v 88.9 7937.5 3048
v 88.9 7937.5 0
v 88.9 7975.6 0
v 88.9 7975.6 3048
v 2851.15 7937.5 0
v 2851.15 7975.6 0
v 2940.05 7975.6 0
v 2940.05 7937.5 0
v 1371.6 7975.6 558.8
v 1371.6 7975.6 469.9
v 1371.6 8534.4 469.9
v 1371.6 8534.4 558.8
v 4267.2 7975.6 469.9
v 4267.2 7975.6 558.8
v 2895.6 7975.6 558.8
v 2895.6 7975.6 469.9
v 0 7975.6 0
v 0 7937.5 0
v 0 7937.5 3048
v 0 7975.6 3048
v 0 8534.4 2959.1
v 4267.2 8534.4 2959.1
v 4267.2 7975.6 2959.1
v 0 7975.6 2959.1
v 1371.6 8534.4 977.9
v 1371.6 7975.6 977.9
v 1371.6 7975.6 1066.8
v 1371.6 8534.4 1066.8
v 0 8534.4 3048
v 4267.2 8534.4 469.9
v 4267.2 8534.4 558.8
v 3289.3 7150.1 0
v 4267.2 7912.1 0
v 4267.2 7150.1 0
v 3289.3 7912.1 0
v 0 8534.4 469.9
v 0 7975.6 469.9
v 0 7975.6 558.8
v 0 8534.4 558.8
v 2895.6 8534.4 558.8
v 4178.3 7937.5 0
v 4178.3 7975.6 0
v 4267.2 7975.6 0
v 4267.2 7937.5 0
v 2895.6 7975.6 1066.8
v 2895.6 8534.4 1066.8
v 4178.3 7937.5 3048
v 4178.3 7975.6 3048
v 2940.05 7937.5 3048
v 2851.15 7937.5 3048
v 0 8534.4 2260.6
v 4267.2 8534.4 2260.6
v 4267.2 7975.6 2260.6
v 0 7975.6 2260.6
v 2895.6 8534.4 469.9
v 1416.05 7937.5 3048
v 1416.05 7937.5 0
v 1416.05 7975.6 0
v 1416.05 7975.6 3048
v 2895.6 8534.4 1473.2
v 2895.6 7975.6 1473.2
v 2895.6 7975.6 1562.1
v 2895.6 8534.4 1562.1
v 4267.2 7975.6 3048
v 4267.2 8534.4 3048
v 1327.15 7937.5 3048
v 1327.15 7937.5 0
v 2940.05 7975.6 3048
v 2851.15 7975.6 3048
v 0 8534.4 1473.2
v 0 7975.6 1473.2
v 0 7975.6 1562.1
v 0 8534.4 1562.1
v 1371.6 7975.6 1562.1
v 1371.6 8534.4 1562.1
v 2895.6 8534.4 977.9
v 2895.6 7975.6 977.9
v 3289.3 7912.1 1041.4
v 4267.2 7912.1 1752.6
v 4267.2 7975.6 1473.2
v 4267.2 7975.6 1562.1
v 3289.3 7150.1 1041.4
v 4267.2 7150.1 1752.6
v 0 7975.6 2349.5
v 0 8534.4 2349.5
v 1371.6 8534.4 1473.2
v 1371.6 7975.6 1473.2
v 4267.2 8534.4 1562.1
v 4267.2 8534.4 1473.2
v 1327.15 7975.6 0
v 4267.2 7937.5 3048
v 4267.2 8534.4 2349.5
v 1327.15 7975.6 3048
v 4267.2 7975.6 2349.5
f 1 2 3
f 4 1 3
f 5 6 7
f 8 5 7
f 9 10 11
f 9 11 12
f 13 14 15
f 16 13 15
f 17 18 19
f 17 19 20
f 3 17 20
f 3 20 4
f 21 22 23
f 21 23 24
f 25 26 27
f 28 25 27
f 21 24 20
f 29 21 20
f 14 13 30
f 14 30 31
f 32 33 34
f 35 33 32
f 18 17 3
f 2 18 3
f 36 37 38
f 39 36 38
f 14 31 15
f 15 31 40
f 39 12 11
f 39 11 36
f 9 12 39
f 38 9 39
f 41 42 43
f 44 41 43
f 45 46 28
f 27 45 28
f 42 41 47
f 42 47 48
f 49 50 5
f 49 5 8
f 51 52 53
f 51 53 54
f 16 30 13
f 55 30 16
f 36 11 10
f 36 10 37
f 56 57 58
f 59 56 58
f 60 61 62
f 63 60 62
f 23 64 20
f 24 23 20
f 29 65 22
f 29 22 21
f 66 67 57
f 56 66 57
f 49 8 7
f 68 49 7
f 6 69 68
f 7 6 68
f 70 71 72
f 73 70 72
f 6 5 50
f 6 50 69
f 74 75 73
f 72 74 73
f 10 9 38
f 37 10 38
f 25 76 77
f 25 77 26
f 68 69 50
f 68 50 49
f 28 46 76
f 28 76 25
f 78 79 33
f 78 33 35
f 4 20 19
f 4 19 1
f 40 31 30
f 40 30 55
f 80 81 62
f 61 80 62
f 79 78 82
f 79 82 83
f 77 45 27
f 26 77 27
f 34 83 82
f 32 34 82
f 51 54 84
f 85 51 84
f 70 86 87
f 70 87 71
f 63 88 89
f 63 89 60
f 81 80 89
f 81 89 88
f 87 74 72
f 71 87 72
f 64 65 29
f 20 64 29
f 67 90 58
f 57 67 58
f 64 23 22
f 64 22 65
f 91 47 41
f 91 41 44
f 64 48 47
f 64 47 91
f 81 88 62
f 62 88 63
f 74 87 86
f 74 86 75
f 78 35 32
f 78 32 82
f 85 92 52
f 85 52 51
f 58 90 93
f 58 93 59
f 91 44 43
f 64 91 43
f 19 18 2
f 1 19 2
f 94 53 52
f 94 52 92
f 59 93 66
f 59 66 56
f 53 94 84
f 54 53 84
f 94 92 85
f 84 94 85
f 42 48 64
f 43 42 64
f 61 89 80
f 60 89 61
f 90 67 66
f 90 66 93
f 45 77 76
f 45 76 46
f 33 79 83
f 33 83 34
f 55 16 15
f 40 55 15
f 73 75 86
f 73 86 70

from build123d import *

# Parameters (mm, degrees)
F4_DEPTH = 762
F5_W     = 1524
F5_H     = 88.9
F6_DEPTH = 558.8
F5_W_2   = 1371.6
F5_W_3   = 4267.2
F7_W     = 88.9
F7_H     = 38.1
F8_DEPTH = 3048


with BuildPart() as f4:
    # F3 (on face) → F4 (new body)
    with BuildSketch(Plane(origin=(0, 7912.1, 0), x_dir=(-1, 0, 0), z_dir=(0, 1, 0))):
        Polygon((-3289.3, 1041.4), (-4267.2, 1752.6), (-4267.2, 0), (-3289.3, 0), align=None)
    extrude(amount=-F4_DEPTH)


with BuildPart() as f6:
    # F5 (on face) → F6 (new body)
    with BuildSketch(Plane(origin=(0, 8534.4, 0), x_dir=(-1, 0, 0), z_dir=(0, 1, 0))):
        with Locations((-2133.6, 1022.35)):
            Rectangle(F5_W, F5_H)
    extrude(amount=-F6_DEPTH)


with BuildPart() as f6b:
    # F5 (on face) → F6, piece 2 (new body)
    with BuildSketch(Plane(origin=(0, 8534.4, 0), x_dir=(-1, 0, 0), z_dir=(0, 1, 0))):
        with Locations((-685.8, 1517.65)):
            Rectangle(F5_W_2, F5_H)
    extrude(amount=-F6_DEPTH)


with BuildPart() as f6c:
    # F5 (on face) → F6, piece 3 (new body)
    with BuildSketch(Plane(origin=(0, 8534.4, 0), x_dir=(-1, 0, 0), z_dir=(0, 1, 0))):
        with Locations((-685.8, 514.35)):
            Rectangle(F5_W_2, F5_H)
    extrude(amount=-F6_DEPTH)


with BuildPart() as f6d:
    # F5 (on face) → F6, piece 4 (new body)
    with BuildSketch(Plane(origin=(0, 8534.4, 0), x_dir=(-1, 0, 0), z_dir=(0, 1, 0))):
        with Locations((-2133.6, 3003.55)):
            Rectangle(F5_W_3, F5_H)
    extrude(amount=-F6_DEPTH)


with BuildPart() as f6e:
    # F5 (on face) → F6, piece 5 (new body)
    with BuildSketch(Plane(origin=(0, 8534.4, 0), x_dir=(-1, 0, 0), z_dir=(0, 1, 0))):
        with Locations((-3581.4, 1517.65)):
            Rectangle(F5_W_2, F5_H)
    extrude(amount=-F6_DEPTH)


with BuildPart() as f6f:
    # F5 (on face) → F6, piece 6 (new body)
    with BuildSketch(Plane(origin=(0, 8534.4, 0), x_dir=(-1, 0, 0), z_dir=(0, 1, 0))):
        with Locations((-3581.4, 514.35)):
            Rectangle(F5_W_2, F5_H)
    extrude(amount=-F6_DEPTH)


with BuildPart() as f6g:
    # F5 (on face) → F6, piece 7 (new body)
    with BuildSketch(Plane(origin=(0, 8534.4, 0), x_dir=(-1, 0, 0), z_dir=(0, 1, 0))):
        with Locations((-2133.6, 2305.05)):
            Rectangle(F5_W_3, F5_H)
    extrude(amount=-F6_DEPTH)


with BuildPart() as f8:
    # F7 (on face) → F8 (new body)
    with BuildSketch(Plane.XY):
        with Locations((4222.75, 7956.55)):
            Rectangle(F7_W, F7_H)
    extrude(amount=F8_DEPTH)


with BuildPart() as f8b:
    # F7 (on face) → F8, piece 2 (new body)
    with BuildSketch(Plane.XY):
        with Locations((2895.6, 7956.55)):
            Rectangle(F7_W, F7_H)
    extrude(amount=F8_DEPTH)


with BuildPart() as f8c:
    # F7 (on face) → F8, piece 3 (new body)
    with BuildSketch(Plane.XY):
        with Locations((1371.6, 7956.55)):
            Rectangle(F7_W, F7_H)
    extrude(amount=F8_DEPTH)


with BuildPart() as f8d:
    # F7 (on face) → F8, piece 4 (new body)
    with BuildSketch(Plane.XY):
        with Locations((44.45, 7956.55)):
            Rectangle(F7_W, F7_H)
    extrude(amount=F8_DEPTH)


solid = Compound([f4.part, f6.part, f6b.part, f6c.part, f6d.part, f6e.part, f6f.part, f6g.part, f8.part, f8b.part, f8c.part, f8d.part])
